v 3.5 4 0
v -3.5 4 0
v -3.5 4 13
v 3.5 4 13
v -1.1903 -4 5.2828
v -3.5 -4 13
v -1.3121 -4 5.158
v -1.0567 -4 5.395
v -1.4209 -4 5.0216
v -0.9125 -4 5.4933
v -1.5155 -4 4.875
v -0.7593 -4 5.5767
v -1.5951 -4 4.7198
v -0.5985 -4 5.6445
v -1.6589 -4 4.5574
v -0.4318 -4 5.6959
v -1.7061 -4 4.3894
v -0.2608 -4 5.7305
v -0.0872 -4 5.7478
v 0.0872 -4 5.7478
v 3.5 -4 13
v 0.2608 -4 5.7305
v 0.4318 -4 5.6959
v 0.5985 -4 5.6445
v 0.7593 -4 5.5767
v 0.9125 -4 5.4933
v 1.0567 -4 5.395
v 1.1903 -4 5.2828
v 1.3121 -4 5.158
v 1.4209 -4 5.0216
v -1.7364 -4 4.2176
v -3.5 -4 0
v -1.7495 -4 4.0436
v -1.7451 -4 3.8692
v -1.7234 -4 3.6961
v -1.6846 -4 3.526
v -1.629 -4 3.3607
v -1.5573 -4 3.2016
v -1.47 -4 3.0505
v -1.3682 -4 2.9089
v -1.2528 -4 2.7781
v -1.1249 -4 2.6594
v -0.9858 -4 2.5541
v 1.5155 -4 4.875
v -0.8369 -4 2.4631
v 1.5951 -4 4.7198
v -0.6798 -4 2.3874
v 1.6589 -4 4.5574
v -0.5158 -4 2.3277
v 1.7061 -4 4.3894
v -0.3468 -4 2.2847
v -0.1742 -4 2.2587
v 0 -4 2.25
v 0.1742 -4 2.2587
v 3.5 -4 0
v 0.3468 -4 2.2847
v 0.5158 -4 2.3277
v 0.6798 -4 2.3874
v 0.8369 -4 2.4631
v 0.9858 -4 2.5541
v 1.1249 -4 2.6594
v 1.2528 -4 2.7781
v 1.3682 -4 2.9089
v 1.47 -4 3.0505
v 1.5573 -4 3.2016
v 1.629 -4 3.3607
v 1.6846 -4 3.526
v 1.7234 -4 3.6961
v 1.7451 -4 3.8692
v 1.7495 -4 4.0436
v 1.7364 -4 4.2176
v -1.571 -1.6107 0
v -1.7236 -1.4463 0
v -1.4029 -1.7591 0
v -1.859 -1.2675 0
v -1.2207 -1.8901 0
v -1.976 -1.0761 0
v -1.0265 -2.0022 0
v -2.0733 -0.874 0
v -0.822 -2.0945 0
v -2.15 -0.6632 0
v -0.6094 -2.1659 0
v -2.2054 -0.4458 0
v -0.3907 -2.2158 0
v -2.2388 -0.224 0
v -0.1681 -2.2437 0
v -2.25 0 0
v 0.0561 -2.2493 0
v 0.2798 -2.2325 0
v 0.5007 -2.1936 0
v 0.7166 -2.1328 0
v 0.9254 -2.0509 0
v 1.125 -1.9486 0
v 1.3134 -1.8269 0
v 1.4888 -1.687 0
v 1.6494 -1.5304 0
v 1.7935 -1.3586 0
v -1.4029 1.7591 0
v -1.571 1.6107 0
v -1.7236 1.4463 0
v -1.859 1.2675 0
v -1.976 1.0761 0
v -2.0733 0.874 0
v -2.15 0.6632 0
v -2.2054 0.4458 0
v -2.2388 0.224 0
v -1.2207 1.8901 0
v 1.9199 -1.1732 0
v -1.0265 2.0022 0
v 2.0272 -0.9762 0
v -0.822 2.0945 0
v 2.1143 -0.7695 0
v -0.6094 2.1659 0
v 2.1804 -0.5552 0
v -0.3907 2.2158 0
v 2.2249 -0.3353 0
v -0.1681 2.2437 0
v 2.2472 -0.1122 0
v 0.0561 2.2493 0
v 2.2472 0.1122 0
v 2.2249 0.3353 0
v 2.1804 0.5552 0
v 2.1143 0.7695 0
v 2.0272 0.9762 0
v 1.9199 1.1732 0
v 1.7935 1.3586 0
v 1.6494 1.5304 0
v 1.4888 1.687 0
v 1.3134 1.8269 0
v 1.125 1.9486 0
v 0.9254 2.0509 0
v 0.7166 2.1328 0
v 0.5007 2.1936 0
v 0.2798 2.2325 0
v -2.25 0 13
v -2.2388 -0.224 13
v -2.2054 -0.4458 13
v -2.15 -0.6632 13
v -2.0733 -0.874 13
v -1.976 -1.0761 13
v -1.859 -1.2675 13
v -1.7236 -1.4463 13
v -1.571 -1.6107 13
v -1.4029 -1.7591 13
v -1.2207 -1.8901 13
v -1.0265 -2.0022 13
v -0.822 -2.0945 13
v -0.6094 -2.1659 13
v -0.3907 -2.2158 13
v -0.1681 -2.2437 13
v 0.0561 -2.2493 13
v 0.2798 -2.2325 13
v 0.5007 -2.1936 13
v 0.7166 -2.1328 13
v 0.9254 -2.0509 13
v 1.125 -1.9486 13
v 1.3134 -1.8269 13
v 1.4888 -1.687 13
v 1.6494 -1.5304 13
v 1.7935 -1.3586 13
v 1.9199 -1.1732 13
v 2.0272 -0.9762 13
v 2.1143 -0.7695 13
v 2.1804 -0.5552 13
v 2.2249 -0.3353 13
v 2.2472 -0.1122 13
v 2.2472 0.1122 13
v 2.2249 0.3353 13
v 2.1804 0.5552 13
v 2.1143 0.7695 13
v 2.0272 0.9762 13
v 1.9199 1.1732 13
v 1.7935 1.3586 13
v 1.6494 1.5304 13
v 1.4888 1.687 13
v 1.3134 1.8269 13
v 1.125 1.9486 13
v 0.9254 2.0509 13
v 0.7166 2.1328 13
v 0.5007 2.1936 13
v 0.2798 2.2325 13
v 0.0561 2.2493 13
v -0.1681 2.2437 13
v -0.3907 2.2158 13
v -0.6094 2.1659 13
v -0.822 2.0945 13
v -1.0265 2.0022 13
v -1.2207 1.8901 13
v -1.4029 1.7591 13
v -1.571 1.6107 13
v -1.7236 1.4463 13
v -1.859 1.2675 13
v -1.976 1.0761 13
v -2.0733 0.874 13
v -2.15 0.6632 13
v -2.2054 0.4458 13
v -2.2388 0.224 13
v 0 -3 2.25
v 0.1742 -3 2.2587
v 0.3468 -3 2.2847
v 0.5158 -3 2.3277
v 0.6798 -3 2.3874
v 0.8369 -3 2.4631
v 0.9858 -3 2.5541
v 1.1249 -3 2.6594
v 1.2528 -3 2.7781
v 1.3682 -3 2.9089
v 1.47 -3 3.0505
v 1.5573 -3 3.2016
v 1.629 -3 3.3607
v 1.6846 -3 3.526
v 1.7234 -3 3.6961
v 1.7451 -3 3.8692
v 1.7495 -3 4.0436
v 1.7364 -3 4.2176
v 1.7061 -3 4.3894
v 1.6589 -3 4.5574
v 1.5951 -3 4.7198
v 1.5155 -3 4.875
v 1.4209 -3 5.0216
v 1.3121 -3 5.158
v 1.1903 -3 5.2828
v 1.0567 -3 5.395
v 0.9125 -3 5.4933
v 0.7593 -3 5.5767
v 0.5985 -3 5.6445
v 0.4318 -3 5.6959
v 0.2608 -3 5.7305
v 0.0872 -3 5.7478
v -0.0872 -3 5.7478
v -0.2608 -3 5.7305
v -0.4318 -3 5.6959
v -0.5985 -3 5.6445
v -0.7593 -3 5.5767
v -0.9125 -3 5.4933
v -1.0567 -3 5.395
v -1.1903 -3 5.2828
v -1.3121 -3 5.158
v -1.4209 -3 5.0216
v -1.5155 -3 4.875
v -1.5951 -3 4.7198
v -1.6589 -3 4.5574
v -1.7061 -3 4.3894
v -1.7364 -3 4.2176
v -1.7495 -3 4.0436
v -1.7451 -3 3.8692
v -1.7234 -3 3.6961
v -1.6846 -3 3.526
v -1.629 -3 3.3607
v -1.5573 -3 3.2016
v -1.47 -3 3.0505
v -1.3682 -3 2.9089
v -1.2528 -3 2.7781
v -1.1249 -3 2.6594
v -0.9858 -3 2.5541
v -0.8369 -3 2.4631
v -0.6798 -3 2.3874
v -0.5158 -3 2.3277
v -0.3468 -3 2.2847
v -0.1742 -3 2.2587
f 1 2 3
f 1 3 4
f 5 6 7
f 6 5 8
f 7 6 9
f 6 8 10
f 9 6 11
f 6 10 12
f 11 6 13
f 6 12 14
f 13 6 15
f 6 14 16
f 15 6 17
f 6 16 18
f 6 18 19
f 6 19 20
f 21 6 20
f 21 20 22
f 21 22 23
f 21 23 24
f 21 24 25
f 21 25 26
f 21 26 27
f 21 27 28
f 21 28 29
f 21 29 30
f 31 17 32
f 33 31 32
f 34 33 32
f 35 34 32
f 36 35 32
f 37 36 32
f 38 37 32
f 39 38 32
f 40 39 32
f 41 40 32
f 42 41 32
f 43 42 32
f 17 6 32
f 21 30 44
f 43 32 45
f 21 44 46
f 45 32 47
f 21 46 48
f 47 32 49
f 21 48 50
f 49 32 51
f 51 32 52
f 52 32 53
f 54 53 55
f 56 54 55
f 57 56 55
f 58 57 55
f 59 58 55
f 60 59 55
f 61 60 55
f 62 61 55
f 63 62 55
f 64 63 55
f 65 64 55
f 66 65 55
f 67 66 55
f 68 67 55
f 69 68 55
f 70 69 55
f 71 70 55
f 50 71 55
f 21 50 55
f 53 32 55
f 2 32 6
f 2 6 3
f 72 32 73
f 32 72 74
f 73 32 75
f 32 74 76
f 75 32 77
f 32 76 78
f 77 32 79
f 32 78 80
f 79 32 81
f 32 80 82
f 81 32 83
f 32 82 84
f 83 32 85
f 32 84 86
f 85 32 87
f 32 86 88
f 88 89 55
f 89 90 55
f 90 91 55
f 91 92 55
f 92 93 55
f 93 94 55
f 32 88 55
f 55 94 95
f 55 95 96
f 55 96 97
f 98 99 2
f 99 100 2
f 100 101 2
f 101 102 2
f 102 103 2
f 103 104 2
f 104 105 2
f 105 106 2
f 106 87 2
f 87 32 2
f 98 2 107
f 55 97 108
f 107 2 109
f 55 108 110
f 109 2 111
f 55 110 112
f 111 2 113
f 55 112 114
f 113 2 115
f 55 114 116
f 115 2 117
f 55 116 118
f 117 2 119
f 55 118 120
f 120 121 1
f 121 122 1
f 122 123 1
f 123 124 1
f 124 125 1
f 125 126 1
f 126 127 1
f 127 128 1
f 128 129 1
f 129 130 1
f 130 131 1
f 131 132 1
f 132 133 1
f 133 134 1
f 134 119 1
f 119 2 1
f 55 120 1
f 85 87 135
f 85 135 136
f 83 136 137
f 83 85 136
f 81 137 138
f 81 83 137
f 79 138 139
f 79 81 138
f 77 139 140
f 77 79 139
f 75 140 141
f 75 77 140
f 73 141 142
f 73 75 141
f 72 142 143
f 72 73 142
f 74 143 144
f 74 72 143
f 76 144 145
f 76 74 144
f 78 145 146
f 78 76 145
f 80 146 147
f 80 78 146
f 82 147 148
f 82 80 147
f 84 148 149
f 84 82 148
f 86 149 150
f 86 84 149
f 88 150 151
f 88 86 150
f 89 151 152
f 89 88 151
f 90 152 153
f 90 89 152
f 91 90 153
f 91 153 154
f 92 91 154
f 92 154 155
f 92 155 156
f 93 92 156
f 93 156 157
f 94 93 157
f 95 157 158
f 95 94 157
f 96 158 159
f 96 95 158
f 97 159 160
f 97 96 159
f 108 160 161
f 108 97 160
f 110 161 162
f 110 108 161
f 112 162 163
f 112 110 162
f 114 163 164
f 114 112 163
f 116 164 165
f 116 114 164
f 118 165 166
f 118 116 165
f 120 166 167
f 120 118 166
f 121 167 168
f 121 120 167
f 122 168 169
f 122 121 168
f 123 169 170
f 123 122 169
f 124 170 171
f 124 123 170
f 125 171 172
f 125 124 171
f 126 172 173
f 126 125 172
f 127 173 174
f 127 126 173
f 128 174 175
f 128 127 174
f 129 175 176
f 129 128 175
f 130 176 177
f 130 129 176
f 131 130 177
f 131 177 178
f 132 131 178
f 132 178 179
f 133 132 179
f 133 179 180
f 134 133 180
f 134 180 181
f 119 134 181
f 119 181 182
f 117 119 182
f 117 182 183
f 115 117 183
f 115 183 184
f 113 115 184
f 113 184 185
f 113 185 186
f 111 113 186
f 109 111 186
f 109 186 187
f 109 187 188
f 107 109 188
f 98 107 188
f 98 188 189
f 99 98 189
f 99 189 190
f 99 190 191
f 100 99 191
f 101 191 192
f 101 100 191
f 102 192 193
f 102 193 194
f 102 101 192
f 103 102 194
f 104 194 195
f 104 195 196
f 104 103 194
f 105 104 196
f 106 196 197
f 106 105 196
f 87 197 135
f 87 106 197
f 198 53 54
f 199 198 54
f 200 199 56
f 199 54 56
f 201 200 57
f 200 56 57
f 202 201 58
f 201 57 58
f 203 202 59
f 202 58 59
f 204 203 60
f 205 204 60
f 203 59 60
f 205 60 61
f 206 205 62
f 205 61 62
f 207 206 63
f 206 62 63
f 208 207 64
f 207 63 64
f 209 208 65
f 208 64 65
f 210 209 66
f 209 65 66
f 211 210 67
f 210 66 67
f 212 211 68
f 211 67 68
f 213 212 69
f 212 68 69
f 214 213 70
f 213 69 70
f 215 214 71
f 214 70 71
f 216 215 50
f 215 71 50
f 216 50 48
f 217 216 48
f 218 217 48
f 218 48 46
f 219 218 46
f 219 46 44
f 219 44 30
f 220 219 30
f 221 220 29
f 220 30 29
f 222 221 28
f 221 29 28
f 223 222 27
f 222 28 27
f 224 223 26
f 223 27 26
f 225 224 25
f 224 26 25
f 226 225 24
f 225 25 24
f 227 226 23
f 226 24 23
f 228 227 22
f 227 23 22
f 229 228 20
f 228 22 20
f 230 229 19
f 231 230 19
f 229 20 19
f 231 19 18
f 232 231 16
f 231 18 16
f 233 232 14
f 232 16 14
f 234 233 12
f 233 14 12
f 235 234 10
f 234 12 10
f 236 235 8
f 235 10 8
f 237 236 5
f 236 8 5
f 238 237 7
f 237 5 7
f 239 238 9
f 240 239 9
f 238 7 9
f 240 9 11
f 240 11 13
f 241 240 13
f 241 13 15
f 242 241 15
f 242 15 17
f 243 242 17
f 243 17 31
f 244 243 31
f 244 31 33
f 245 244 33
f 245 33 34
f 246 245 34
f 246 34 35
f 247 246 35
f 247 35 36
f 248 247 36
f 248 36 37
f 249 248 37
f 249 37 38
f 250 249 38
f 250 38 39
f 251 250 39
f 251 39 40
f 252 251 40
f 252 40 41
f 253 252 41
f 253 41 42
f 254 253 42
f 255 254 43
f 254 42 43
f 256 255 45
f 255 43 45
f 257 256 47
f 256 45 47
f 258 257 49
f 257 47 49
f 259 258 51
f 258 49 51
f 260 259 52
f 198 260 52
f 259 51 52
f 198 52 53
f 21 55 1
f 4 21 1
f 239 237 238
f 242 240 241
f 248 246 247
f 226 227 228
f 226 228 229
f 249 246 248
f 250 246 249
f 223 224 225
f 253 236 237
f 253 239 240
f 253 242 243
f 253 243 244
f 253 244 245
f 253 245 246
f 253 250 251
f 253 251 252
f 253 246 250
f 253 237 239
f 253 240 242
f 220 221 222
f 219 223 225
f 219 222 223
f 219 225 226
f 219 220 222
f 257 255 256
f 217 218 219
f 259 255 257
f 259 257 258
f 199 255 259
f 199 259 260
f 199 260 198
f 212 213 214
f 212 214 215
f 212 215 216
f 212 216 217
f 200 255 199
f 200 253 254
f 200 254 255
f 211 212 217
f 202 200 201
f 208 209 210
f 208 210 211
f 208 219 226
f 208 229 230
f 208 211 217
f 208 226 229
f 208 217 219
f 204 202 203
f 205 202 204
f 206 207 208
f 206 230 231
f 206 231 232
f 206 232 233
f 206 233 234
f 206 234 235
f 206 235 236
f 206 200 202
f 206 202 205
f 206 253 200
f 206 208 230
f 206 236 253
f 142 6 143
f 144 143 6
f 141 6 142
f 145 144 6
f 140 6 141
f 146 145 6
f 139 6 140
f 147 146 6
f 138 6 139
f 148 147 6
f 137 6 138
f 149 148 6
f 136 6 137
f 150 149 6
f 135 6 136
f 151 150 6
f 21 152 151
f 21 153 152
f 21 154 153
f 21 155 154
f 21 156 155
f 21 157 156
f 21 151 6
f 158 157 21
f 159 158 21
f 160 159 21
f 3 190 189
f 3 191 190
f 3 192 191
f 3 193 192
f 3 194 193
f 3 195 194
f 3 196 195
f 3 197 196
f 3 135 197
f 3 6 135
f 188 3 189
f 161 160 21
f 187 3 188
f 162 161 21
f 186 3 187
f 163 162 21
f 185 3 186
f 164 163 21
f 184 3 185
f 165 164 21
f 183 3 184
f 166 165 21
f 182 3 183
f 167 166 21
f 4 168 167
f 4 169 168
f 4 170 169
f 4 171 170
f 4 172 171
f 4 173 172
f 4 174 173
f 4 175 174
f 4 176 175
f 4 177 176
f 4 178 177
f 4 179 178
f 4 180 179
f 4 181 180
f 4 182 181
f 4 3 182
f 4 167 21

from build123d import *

# Parameters (mm, degrees)
ESQUISSE1_W             = 7
ESQUISSE1_H             = 8
ESQUISSE1_R             = 2.25
BOSS_EXTRU_1_DEPTH      = 13
ESQUISSE2_R             = 1.75
ENL_V_MAT_EXTRU_1_DEPTH = 1


with BuildPart() as part:
    # Esquisse1 → Boss.-Extru.1 (new body)
    with BuildSketch(Plane.XY):
        Rectangle(ESQUISSE1_W, ESQUISSE1_H)
        with Locations(Location((0, 0, 0), (0, 0, 180))):
            Circle(ESQUISSE1_R, mode=Mode.SUBTRACT)
    extrude(amount=BOSS_EXTRU_1_DEPTH)

    # Esquisse2 → Enlèv. mat.-Extru.1 (cut)
    with BuildSketch(Plane.XZ.offset(4)):
        with Locations(Location((0, 4, 0), (0, 0, 270))):
            Circle(ESQUISSE2_R)
    extrude(amount=-ENL_V_MAT_EXTRU_1_DEPTH, mode=Mode.SUBTRACT)


solid = part.part
